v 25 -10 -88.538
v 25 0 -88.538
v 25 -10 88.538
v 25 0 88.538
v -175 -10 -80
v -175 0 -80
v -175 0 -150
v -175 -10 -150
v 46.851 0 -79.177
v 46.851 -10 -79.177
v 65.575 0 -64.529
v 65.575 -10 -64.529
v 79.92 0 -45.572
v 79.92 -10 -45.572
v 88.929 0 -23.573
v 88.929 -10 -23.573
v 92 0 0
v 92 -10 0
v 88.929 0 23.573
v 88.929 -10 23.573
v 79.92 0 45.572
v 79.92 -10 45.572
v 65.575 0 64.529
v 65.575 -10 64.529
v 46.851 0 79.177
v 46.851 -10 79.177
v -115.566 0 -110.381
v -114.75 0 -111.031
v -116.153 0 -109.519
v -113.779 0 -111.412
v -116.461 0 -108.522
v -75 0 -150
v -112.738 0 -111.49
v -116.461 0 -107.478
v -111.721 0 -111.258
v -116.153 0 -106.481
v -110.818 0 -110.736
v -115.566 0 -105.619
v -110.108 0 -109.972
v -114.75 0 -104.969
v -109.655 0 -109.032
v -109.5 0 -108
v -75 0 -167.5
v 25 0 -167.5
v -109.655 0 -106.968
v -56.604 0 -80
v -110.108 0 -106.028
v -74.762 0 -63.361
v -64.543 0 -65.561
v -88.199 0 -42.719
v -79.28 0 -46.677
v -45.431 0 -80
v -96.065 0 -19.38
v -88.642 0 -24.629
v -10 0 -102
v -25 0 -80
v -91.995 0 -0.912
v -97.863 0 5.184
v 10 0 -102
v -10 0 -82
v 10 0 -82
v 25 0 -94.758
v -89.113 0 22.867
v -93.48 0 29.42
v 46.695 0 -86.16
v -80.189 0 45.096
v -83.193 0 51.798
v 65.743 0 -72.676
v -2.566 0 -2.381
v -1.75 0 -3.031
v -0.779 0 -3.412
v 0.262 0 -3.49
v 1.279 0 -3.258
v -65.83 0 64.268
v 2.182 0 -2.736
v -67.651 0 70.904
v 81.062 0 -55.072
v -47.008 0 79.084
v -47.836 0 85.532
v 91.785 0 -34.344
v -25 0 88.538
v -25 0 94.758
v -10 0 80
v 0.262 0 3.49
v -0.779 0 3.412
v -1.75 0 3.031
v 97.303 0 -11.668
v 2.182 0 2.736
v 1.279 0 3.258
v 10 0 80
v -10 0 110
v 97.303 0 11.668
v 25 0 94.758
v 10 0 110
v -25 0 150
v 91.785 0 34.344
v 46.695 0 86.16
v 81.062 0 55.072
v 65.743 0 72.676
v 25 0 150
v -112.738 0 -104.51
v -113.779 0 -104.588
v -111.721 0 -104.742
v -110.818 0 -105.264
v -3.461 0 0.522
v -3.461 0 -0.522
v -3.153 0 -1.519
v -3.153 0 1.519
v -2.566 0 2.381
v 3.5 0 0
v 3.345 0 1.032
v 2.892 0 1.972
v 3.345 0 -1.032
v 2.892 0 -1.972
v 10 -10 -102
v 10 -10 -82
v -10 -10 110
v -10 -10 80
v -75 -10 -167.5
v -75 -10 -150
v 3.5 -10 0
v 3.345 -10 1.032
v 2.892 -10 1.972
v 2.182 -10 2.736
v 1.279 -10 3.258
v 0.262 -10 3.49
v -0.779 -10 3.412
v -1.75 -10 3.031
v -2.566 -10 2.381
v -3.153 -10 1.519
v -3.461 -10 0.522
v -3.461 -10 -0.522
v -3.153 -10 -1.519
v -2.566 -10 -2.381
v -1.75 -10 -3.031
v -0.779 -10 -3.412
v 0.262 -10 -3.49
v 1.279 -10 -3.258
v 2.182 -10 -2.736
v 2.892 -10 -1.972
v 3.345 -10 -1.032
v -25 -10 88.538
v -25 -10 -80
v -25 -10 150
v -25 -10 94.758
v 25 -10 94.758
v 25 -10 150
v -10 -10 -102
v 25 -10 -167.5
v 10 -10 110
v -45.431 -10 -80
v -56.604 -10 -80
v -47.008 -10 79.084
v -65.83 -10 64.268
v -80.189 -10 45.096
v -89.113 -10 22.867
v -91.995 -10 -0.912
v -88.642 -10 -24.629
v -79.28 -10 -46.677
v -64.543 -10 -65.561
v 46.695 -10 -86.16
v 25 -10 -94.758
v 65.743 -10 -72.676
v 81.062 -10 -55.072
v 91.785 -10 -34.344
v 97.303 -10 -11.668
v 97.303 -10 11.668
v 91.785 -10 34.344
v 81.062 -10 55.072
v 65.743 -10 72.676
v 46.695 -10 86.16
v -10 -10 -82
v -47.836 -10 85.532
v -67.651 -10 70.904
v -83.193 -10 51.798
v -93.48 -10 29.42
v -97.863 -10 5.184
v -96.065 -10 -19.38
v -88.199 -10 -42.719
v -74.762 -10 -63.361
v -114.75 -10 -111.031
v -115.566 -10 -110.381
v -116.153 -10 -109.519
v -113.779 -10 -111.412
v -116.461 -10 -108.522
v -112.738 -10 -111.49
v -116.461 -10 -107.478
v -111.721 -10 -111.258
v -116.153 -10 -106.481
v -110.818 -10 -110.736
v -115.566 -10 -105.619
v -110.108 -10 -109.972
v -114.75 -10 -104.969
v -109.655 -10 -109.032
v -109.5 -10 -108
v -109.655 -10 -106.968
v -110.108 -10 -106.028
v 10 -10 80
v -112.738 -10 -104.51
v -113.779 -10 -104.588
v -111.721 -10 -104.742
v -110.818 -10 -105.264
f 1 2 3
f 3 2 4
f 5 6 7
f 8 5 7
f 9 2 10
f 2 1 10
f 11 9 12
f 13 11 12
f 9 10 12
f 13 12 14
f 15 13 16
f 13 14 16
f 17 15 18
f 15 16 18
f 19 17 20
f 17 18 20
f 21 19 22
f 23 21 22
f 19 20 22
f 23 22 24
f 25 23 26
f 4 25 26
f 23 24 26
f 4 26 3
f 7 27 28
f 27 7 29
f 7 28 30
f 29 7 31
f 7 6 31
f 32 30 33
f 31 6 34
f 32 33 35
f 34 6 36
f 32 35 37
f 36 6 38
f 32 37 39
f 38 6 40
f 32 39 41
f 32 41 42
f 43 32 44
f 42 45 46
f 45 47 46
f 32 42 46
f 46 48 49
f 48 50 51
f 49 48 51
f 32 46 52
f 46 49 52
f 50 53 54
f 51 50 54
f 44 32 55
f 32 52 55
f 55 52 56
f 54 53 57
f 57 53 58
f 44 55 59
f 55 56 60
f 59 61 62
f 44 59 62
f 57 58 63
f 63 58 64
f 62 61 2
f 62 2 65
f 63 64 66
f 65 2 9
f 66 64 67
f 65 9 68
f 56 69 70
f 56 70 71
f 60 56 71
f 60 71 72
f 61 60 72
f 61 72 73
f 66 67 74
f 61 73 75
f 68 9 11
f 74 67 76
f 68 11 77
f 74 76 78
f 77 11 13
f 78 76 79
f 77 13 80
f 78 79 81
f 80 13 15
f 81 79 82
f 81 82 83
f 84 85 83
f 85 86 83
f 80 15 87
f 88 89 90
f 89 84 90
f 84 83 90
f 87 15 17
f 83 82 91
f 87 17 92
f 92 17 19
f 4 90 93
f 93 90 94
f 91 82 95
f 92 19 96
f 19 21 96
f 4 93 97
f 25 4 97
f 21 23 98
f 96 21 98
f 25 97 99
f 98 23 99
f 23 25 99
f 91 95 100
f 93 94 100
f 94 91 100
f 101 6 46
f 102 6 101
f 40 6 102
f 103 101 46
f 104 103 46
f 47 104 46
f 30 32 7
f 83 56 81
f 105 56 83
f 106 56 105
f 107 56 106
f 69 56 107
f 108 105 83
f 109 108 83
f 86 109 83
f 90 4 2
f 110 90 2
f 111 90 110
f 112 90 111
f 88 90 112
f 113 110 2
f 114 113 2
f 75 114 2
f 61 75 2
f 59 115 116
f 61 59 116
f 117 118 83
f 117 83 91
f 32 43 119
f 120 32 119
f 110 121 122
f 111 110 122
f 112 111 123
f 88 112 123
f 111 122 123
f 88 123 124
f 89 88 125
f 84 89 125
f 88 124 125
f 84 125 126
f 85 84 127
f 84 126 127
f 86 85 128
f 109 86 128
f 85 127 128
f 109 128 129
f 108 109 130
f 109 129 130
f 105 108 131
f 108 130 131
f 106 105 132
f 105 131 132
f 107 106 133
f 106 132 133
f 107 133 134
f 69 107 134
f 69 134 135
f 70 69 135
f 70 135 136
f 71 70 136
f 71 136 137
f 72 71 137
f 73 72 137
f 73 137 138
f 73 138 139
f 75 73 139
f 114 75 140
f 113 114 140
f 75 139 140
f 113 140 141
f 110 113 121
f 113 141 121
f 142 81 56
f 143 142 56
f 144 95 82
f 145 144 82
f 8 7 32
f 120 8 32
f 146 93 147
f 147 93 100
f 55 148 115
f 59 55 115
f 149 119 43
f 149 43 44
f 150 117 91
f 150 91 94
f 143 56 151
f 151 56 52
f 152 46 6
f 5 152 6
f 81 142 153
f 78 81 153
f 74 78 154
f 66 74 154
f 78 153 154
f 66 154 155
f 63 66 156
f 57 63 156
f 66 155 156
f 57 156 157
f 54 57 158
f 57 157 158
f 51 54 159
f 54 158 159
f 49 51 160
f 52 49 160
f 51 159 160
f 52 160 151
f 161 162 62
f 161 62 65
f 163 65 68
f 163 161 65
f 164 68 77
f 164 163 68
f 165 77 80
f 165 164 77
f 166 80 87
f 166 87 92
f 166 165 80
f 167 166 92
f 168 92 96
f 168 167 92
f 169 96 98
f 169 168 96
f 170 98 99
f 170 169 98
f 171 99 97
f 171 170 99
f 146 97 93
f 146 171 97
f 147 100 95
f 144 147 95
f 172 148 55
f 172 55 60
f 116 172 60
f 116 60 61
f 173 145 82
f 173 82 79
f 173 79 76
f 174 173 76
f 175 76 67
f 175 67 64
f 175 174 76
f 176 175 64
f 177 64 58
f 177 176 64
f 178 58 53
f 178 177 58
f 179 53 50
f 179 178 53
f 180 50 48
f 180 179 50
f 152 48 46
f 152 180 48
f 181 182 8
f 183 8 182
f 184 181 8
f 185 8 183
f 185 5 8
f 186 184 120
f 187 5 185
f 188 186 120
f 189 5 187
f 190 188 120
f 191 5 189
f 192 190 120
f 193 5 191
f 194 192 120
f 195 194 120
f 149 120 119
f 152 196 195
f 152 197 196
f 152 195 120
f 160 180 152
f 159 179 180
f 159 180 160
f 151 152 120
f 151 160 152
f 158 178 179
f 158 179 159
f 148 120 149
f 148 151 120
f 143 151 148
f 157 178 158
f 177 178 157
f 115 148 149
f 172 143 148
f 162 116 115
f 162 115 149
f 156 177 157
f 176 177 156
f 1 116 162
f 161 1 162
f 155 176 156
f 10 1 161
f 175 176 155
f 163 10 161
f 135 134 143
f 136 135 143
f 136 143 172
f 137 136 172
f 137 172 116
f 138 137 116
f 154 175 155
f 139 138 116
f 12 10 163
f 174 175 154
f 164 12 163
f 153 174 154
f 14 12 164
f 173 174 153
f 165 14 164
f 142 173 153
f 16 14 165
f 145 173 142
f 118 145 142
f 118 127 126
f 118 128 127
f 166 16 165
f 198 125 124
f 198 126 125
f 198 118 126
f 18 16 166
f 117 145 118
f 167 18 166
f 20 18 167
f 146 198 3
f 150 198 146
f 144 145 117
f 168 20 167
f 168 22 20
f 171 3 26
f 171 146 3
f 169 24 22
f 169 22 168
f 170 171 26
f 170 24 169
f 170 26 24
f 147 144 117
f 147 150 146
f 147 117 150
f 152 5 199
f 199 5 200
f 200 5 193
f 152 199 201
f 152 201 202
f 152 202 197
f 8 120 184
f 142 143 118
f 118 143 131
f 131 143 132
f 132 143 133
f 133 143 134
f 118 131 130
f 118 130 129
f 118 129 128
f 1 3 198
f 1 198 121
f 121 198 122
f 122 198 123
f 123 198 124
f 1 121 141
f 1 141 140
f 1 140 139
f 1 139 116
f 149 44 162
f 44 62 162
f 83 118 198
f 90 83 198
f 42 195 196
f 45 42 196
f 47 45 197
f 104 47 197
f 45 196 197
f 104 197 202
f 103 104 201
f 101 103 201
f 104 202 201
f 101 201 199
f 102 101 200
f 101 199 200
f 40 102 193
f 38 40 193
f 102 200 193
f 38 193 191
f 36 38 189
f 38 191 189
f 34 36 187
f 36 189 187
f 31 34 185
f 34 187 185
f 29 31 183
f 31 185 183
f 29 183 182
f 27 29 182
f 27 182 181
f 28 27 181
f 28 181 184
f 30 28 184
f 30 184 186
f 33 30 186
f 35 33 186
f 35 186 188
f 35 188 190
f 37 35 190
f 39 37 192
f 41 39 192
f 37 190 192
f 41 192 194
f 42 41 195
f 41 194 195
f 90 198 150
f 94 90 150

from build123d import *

# Parameters (mm, degrees)
F1_DEPTH = 10
F2_R     = 98
F2_R_2   = 92
F3_DEPTH = 10
F4_W     = 100
F4_H     = 10
F5_DEPTH = 17.5
F6_W     = 20
F6_H     = 20
F6_H_2   = 30
F6_R     = 3.5
F7_DEPTH = 10


with BuildPart() as f1:
    # F0 (on Front) → F1 (new body)
    with BuildSketch(Plane.XZ):
        Polygon((25, 150), (-25, 150), (-25, -80), (-175, -80), (-175, -150), (25, -150), align=None)
    extrude(amount=F1_DEPTH)

    # F2 (on face) → F3 (join)
    with BuildSketch(Plane.XZ.offset(10)):
        Circle(F2_R)
        Circle(F2_R_2, mode=Mode.SUBTRACT)
    extrude(amount=-F3_DEPTH)

    # F4 (on face) → F5 (join)
    with BuildSketch(Plane(origin=(0, 0, -150), x_dir=(1, 0, 0), z_dir=(0, 0, -1))):
        with Locations((-25, 5)):
            Rectangle(F4_W, F4_H)
    extrude(amount=F5_DEPTH)

    # F6 (on face) → F7 (cut)
    with BuildSketch(Plane.XZ.offset(10)):
        with Locations((0, -92)):
            Rectangle(F6_W, F6_H)
        with Locations((0, 95)):
            Rectangle(F6_W, F6_H_2)
        Circle(F6_R)
        with Locations((-113, -108)):
            Circle(F6_R)
    extrude(amount=-F7_DEPTH, mode=Mode.SUBTRACT)


solid = f1.part
